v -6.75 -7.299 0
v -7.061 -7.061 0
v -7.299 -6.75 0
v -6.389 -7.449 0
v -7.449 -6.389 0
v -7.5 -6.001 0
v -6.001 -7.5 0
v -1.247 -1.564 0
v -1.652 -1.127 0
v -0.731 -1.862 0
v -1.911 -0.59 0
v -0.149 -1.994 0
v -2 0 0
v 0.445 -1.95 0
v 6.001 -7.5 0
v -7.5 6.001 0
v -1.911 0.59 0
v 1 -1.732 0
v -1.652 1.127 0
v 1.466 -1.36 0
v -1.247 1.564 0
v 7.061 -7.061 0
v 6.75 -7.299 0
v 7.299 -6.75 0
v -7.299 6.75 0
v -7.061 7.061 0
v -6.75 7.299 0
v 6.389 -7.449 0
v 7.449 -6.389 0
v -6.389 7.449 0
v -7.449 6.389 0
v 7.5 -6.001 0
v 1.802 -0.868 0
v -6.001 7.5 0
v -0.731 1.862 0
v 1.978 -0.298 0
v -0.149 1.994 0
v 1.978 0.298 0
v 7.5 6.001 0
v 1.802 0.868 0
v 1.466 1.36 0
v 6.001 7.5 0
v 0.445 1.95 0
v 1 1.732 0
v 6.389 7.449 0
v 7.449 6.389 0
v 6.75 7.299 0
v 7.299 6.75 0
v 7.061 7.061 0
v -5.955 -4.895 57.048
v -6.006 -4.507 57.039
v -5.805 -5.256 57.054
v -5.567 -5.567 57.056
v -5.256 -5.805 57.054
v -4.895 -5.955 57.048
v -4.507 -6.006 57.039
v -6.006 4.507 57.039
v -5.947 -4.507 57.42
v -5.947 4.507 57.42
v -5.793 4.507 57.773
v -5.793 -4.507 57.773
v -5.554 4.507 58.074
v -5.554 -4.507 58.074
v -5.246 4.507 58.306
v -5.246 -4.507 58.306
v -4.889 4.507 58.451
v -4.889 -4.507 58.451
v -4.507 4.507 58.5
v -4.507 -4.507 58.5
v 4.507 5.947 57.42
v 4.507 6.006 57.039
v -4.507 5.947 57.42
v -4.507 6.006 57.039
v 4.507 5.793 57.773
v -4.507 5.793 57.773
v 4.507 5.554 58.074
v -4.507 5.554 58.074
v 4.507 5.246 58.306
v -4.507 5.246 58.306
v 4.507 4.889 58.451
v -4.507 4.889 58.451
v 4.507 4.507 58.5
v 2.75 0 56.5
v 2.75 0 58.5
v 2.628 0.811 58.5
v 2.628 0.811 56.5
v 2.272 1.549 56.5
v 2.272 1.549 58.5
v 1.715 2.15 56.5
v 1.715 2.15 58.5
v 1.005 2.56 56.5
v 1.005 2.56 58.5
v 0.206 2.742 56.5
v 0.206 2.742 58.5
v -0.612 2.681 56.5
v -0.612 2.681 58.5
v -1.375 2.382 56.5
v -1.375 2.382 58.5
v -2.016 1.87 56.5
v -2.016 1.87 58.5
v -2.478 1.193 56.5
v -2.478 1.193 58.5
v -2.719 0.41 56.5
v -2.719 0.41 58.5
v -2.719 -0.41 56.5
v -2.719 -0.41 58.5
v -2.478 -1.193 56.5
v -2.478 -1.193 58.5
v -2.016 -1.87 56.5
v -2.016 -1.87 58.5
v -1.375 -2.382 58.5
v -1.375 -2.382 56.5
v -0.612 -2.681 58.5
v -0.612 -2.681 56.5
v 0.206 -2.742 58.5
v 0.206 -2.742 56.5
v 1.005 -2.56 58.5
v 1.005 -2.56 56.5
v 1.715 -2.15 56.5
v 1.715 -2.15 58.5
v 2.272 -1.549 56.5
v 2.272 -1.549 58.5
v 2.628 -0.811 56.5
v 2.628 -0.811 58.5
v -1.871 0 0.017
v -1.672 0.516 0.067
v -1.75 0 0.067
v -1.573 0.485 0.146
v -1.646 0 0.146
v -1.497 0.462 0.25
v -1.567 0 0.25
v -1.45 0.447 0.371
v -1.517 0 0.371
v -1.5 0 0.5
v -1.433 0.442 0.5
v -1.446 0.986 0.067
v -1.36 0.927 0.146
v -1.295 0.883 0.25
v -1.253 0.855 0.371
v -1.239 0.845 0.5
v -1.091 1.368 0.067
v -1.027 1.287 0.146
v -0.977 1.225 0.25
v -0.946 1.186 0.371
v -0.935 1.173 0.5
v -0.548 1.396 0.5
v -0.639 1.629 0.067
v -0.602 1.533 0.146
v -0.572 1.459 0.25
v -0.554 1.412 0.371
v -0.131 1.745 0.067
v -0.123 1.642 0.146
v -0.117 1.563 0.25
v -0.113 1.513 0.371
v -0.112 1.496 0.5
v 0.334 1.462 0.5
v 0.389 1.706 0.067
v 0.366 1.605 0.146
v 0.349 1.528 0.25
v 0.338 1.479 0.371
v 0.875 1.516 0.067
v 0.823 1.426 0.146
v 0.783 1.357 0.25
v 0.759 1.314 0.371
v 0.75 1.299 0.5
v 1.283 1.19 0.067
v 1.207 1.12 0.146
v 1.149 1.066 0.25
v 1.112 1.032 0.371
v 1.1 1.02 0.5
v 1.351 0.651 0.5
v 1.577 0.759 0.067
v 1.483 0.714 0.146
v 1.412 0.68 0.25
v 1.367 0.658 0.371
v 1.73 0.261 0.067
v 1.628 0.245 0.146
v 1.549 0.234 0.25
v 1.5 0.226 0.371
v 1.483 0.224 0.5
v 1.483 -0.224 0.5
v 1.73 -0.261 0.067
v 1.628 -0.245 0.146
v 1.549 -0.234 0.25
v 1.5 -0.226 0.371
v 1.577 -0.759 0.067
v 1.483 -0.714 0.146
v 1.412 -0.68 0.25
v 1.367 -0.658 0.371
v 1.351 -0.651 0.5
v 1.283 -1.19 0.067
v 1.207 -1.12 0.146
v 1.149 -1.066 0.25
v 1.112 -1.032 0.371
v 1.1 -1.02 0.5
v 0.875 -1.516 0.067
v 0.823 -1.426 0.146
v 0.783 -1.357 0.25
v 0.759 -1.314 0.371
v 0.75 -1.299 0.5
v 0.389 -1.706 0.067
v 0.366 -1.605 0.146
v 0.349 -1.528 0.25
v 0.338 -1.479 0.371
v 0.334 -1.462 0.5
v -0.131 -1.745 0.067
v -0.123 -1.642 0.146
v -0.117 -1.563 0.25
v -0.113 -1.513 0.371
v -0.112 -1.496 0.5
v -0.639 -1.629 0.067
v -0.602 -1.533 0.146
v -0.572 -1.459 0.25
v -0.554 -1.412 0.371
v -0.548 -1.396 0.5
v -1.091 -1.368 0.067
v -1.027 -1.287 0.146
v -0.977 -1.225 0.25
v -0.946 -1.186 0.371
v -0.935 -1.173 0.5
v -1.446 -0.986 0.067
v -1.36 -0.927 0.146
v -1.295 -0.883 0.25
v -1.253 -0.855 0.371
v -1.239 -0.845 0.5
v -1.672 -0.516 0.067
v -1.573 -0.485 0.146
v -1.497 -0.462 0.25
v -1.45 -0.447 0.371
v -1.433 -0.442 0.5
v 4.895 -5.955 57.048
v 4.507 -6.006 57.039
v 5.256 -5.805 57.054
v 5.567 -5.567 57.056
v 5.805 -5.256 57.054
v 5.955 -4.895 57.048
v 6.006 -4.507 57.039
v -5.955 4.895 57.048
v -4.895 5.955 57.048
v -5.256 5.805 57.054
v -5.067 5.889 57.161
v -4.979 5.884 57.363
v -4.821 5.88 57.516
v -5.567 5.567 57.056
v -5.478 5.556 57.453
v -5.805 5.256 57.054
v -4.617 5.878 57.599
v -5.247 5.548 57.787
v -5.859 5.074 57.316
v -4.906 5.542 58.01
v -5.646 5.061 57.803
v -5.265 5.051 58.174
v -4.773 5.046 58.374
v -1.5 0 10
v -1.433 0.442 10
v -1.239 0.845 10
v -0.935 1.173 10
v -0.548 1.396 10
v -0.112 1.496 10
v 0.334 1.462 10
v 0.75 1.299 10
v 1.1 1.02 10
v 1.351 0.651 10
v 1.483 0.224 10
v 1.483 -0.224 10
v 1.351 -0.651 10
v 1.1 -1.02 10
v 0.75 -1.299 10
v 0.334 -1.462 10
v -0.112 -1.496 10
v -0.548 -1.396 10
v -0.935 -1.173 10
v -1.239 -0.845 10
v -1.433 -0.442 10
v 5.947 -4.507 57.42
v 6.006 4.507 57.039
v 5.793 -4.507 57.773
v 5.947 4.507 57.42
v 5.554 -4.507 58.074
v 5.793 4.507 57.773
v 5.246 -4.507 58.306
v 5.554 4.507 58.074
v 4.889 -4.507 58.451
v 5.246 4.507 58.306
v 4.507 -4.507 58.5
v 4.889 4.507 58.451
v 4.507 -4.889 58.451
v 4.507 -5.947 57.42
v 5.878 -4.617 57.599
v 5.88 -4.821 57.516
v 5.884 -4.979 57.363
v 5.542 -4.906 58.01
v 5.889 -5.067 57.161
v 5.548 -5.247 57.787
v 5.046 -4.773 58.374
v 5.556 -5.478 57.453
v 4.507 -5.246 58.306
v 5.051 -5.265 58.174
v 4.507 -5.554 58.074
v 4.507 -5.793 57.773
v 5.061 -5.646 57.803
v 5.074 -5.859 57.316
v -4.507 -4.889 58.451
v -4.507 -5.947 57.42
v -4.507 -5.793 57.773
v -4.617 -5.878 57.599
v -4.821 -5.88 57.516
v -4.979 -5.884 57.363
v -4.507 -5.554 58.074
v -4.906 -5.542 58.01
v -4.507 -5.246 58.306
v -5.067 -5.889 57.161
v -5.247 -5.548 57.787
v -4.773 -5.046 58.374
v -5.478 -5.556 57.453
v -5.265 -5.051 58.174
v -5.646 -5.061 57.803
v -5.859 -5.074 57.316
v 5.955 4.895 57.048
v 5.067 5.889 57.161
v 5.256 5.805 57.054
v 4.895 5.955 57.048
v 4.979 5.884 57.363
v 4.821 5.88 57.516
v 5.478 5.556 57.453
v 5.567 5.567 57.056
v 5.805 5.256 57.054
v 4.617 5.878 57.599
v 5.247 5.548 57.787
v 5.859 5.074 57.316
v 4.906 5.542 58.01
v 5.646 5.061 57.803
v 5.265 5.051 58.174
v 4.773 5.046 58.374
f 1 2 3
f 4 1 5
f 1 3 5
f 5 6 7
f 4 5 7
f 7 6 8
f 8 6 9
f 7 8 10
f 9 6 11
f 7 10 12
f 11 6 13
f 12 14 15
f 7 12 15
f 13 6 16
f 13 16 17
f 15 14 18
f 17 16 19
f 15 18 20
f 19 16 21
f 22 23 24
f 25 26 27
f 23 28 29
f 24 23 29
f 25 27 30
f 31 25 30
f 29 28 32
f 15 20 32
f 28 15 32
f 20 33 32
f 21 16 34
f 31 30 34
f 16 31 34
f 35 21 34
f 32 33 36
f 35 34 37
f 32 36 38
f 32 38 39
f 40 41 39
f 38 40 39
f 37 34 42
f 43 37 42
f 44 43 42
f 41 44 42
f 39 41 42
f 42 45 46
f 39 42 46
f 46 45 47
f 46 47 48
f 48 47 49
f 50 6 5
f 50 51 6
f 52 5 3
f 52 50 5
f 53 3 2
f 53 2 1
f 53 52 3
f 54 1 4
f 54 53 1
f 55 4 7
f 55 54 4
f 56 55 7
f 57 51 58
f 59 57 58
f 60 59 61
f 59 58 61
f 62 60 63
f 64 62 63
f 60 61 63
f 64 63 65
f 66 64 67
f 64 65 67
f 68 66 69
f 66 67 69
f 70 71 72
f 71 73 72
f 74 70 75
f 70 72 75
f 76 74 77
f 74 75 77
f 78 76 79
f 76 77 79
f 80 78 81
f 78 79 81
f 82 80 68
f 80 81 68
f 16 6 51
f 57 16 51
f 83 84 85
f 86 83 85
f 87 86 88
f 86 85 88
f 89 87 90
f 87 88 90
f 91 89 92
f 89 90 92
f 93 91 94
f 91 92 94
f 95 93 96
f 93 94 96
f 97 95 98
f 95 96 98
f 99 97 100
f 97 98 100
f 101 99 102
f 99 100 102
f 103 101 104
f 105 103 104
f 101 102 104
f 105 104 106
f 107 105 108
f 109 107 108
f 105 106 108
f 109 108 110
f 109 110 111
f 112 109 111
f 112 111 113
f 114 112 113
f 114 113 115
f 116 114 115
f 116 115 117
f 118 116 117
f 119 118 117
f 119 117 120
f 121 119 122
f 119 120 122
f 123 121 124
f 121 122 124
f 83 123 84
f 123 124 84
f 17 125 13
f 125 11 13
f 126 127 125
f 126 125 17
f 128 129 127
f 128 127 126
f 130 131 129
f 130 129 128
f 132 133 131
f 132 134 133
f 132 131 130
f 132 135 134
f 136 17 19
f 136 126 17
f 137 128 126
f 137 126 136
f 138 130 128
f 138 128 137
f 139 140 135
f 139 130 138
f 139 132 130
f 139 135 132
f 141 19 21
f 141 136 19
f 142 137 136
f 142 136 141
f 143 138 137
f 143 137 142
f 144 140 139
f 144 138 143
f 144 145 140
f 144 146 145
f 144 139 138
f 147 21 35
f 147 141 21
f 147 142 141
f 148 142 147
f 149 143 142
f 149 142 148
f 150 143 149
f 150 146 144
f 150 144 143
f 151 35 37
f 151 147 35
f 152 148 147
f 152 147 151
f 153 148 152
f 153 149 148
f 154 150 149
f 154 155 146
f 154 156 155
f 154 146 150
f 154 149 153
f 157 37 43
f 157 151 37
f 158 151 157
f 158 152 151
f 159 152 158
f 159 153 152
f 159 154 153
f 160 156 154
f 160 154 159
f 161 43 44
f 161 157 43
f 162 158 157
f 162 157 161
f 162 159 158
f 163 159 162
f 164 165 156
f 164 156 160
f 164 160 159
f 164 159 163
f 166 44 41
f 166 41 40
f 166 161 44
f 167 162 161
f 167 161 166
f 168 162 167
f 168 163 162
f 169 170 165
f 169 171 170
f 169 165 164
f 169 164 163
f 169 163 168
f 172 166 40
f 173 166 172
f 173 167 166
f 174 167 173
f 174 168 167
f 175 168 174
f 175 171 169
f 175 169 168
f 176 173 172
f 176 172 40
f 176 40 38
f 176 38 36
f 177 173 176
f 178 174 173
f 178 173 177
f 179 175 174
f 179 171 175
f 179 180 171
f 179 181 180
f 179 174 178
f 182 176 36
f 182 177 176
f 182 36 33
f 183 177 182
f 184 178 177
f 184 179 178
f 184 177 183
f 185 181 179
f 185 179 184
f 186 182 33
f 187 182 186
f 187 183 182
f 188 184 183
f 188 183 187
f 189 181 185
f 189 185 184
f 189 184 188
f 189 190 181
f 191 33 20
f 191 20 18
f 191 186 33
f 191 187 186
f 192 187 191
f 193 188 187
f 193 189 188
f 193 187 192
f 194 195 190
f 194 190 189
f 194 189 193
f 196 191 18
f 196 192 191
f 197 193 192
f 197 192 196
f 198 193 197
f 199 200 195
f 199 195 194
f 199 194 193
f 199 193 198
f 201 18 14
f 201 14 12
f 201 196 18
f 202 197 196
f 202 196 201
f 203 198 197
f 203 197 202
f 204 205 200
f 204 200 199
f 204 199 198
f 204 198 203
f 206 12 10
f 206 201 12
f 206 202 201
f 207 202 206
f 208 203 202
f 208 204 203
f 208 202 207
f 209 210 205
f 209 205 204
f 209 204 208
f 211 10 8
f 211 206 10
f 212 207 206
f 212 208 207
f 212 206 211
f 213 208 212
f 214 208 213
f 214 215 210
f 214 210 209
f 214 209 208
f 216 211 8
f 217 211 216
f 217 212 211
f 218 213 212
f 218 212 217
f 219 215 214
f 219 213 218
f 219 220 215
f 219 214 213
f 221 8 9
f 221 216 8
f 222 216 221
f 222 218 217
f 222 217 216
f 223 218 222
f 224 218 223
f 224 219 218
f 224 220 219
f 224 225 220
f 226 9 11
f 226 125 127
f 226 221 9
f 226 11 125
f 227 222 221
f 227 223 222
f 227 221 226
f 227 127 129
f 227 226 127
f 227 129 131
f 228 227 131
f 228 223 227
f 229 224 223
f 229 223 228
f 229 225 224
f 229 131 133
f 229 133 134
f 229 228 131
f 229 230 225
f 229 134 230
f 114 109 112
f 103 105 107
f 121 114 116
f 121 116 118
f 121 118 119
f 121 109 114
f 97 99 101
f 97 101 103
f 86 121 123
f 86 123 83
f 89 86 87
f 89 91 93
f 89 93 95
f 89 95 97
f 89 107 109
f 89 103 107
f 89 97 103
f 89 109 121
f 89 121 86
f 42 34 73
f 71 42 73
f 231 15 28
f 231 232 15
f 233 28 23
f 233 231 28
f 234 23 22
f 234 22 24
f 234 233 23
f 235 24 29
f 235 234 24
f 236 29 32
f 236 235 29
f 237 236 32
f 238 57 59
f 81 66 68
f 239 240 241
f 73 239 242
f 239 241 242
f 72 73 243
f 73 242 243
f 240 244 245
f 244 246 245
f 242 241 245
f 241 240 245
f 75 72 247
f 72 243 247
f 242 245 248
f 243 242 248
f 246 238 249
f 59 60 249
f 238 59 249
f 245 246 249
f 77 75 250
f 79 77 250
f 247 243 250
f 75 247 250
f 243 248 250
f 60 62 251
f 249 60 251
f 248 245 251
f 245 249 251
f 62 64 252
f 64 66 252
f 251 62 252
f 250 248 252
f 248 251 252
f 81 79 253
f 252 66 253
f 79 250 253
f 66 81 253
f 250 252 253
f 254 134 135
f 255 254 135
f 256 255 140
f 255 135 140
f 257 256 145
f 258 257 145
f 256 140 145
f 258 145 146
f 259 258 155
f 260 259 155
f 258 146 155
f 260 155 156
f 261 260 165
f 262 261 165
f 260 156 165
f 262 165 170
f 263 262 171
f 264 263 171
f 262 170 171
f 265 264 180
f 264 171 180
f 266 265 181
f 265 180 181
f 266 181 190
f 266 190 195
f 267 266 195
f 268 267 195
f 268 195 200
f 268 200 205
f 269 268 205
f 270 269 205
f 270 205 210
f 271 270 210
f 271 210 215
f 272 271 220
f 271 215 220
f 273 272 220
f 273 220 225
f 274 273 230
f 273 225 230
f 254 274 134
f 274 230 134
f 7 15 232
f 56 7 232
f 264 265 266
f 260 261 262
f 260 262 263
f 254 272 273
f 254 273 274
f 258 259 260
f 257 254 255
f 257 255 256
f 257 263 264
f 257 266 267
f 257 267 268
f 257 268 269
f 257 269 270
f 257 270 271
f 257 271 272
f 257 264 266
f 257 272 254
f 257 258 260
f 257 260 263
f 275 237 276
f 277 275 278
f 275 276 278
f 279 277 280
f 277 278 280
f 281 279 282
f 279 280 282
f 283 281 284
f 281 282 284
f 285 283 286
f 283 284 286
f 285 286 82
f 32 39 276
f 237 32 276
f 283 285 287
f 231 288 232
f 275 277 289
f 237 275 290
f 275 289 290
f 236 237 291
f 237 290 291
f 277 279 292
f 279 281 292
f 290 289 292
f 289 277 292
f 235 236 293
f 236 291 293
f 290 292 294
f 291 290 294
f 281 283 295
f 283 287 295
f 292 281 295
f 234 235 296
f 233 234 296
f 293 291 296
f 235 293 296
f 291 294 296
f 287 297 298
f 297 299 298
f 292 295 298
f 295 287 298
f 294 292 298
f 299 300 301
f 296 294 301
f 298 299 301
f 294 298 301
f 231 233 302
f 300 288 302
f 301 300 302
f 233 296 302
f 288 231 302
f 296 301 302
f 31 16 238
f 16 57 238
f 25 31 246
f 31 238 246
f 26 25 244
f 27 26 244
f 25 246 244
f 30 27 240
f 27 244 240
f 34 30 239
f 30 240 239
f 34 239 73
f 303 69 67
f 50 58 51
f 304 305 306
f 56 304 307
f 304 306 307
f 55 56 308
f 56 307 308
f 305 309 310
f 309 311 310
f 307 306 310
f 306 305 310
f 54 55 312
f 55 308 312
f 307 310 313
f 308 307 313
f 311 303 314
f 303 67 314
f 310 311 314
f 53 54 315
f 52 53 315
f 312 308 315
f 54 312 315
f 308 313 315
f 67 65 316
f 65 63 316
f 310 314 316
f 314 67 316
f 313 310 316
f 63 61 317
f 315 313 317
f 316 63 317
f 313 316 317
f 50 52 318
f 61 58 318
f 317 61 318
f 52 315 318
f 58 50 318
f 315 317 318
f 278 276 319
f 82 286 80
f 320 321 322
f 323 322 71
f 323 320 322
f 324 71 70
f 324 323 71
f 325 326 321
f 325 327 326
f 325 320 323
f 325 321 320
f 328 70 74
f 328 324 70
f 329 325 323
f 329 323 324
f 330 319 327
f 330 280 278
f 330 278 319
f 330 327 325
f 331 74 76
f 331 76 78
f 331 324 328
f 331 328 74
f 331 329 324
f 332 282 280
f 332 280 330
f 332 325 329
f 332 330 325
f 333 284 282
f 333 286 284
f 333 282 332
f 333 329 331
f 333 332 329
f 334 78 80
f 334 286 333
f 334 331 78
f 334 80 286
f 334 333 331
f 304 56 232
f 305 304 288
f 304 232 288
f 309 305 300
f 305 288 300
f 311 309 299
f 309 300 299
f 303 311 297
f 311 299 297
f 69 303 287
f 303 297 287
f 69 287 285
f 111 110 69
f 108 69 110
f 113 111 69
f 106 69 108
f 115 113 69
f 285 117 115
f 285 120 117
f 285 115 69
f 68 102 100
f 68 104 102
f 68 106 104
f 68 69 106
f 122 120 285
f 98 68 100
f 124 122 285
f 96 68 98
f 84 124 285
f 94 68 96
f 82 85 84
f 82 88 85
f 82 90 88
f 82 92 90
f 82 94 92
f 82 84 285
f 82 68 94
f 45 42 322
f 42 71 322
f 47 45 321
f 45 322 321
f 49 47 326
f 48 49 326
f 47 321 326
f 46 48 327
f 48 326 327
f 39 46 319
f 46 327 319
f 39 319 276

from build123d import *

# Parameters (mm, degrees)
SKETCH1_W           = 15
SKETCH1_H           = 15
BOSS_EXTRUDE1_DEPTH = 58.5
BOSS_EXTRUDE1_TAPER = 1.5
SKETCH2_R           = 1.5
CUT_EXTRUDE1_DEPTH  = 10
SKETCH3_R           = 2.75
CUT_EXTRUDE2_DEPTH  = 2
FILLET1_R           = 1.5
FILLET2_R           = 0.5


with BuildPart() as part:
    # Sketch1 → Boss-Extrude1 (new body)
    with BuildSketch(Plane.XY):
        Rectangle(SKETCH1_W, SKETCH1_H)
    extrude(amount=BOSS_EXTRUDE1_DEPTH, taper=BOSS_EXTRUDE1_TAPER)

    # Sketch2 → Cut-Extrude1 (cut)
    with BuildSketch(Plane(origin=(0, 0, 0), x_dir=(-1, 0, 0), z_dir=(0, 0, -1))):
        Circle(SKETCH2_R)
    extrude(amount=-CUT_EXTRUDE1_DEPTH, mode=Mode.SUBTRACT)

    # Sketch3 → Cut-Extrude2 (cut)
    with BuildSketch(Plane.XY.offset(58.5)):
        Circle(SKETCH3_R)
    extrude(amount=-CUT_EXTRUDE2_DEPTH, mode=Mode.SUBTRACT)

    # Fillet1
    fillet1_edges = [part.edges().sort_by_distance(p)[0] for p in [
        (-5.968123588, 0, 58.5),
        (0, -5.968123588, 58.5),
        (5.968123588, 0, 58.5),
        (6.734061794, -6.734061794, 29.25),
        (-6.734061794, -6.734061794, 29.25),
        (-6.734061332, 6.734061332, 29.250017641),
        (6.734061794, 6.734061794, 29.25),
        (0, 5.968123588, 58.5),
    ]]
    fillet(fillet1_edges, radius=FILLET1_R)

    # Fillet2
    fillet2_edges = [part.edges().sort_by_distance(p)[0] for p in [
        (1.5, 0, 0),
    ]]
    fillet(fillet2_edges, radius=FILLET2_R)


solid = part.part
